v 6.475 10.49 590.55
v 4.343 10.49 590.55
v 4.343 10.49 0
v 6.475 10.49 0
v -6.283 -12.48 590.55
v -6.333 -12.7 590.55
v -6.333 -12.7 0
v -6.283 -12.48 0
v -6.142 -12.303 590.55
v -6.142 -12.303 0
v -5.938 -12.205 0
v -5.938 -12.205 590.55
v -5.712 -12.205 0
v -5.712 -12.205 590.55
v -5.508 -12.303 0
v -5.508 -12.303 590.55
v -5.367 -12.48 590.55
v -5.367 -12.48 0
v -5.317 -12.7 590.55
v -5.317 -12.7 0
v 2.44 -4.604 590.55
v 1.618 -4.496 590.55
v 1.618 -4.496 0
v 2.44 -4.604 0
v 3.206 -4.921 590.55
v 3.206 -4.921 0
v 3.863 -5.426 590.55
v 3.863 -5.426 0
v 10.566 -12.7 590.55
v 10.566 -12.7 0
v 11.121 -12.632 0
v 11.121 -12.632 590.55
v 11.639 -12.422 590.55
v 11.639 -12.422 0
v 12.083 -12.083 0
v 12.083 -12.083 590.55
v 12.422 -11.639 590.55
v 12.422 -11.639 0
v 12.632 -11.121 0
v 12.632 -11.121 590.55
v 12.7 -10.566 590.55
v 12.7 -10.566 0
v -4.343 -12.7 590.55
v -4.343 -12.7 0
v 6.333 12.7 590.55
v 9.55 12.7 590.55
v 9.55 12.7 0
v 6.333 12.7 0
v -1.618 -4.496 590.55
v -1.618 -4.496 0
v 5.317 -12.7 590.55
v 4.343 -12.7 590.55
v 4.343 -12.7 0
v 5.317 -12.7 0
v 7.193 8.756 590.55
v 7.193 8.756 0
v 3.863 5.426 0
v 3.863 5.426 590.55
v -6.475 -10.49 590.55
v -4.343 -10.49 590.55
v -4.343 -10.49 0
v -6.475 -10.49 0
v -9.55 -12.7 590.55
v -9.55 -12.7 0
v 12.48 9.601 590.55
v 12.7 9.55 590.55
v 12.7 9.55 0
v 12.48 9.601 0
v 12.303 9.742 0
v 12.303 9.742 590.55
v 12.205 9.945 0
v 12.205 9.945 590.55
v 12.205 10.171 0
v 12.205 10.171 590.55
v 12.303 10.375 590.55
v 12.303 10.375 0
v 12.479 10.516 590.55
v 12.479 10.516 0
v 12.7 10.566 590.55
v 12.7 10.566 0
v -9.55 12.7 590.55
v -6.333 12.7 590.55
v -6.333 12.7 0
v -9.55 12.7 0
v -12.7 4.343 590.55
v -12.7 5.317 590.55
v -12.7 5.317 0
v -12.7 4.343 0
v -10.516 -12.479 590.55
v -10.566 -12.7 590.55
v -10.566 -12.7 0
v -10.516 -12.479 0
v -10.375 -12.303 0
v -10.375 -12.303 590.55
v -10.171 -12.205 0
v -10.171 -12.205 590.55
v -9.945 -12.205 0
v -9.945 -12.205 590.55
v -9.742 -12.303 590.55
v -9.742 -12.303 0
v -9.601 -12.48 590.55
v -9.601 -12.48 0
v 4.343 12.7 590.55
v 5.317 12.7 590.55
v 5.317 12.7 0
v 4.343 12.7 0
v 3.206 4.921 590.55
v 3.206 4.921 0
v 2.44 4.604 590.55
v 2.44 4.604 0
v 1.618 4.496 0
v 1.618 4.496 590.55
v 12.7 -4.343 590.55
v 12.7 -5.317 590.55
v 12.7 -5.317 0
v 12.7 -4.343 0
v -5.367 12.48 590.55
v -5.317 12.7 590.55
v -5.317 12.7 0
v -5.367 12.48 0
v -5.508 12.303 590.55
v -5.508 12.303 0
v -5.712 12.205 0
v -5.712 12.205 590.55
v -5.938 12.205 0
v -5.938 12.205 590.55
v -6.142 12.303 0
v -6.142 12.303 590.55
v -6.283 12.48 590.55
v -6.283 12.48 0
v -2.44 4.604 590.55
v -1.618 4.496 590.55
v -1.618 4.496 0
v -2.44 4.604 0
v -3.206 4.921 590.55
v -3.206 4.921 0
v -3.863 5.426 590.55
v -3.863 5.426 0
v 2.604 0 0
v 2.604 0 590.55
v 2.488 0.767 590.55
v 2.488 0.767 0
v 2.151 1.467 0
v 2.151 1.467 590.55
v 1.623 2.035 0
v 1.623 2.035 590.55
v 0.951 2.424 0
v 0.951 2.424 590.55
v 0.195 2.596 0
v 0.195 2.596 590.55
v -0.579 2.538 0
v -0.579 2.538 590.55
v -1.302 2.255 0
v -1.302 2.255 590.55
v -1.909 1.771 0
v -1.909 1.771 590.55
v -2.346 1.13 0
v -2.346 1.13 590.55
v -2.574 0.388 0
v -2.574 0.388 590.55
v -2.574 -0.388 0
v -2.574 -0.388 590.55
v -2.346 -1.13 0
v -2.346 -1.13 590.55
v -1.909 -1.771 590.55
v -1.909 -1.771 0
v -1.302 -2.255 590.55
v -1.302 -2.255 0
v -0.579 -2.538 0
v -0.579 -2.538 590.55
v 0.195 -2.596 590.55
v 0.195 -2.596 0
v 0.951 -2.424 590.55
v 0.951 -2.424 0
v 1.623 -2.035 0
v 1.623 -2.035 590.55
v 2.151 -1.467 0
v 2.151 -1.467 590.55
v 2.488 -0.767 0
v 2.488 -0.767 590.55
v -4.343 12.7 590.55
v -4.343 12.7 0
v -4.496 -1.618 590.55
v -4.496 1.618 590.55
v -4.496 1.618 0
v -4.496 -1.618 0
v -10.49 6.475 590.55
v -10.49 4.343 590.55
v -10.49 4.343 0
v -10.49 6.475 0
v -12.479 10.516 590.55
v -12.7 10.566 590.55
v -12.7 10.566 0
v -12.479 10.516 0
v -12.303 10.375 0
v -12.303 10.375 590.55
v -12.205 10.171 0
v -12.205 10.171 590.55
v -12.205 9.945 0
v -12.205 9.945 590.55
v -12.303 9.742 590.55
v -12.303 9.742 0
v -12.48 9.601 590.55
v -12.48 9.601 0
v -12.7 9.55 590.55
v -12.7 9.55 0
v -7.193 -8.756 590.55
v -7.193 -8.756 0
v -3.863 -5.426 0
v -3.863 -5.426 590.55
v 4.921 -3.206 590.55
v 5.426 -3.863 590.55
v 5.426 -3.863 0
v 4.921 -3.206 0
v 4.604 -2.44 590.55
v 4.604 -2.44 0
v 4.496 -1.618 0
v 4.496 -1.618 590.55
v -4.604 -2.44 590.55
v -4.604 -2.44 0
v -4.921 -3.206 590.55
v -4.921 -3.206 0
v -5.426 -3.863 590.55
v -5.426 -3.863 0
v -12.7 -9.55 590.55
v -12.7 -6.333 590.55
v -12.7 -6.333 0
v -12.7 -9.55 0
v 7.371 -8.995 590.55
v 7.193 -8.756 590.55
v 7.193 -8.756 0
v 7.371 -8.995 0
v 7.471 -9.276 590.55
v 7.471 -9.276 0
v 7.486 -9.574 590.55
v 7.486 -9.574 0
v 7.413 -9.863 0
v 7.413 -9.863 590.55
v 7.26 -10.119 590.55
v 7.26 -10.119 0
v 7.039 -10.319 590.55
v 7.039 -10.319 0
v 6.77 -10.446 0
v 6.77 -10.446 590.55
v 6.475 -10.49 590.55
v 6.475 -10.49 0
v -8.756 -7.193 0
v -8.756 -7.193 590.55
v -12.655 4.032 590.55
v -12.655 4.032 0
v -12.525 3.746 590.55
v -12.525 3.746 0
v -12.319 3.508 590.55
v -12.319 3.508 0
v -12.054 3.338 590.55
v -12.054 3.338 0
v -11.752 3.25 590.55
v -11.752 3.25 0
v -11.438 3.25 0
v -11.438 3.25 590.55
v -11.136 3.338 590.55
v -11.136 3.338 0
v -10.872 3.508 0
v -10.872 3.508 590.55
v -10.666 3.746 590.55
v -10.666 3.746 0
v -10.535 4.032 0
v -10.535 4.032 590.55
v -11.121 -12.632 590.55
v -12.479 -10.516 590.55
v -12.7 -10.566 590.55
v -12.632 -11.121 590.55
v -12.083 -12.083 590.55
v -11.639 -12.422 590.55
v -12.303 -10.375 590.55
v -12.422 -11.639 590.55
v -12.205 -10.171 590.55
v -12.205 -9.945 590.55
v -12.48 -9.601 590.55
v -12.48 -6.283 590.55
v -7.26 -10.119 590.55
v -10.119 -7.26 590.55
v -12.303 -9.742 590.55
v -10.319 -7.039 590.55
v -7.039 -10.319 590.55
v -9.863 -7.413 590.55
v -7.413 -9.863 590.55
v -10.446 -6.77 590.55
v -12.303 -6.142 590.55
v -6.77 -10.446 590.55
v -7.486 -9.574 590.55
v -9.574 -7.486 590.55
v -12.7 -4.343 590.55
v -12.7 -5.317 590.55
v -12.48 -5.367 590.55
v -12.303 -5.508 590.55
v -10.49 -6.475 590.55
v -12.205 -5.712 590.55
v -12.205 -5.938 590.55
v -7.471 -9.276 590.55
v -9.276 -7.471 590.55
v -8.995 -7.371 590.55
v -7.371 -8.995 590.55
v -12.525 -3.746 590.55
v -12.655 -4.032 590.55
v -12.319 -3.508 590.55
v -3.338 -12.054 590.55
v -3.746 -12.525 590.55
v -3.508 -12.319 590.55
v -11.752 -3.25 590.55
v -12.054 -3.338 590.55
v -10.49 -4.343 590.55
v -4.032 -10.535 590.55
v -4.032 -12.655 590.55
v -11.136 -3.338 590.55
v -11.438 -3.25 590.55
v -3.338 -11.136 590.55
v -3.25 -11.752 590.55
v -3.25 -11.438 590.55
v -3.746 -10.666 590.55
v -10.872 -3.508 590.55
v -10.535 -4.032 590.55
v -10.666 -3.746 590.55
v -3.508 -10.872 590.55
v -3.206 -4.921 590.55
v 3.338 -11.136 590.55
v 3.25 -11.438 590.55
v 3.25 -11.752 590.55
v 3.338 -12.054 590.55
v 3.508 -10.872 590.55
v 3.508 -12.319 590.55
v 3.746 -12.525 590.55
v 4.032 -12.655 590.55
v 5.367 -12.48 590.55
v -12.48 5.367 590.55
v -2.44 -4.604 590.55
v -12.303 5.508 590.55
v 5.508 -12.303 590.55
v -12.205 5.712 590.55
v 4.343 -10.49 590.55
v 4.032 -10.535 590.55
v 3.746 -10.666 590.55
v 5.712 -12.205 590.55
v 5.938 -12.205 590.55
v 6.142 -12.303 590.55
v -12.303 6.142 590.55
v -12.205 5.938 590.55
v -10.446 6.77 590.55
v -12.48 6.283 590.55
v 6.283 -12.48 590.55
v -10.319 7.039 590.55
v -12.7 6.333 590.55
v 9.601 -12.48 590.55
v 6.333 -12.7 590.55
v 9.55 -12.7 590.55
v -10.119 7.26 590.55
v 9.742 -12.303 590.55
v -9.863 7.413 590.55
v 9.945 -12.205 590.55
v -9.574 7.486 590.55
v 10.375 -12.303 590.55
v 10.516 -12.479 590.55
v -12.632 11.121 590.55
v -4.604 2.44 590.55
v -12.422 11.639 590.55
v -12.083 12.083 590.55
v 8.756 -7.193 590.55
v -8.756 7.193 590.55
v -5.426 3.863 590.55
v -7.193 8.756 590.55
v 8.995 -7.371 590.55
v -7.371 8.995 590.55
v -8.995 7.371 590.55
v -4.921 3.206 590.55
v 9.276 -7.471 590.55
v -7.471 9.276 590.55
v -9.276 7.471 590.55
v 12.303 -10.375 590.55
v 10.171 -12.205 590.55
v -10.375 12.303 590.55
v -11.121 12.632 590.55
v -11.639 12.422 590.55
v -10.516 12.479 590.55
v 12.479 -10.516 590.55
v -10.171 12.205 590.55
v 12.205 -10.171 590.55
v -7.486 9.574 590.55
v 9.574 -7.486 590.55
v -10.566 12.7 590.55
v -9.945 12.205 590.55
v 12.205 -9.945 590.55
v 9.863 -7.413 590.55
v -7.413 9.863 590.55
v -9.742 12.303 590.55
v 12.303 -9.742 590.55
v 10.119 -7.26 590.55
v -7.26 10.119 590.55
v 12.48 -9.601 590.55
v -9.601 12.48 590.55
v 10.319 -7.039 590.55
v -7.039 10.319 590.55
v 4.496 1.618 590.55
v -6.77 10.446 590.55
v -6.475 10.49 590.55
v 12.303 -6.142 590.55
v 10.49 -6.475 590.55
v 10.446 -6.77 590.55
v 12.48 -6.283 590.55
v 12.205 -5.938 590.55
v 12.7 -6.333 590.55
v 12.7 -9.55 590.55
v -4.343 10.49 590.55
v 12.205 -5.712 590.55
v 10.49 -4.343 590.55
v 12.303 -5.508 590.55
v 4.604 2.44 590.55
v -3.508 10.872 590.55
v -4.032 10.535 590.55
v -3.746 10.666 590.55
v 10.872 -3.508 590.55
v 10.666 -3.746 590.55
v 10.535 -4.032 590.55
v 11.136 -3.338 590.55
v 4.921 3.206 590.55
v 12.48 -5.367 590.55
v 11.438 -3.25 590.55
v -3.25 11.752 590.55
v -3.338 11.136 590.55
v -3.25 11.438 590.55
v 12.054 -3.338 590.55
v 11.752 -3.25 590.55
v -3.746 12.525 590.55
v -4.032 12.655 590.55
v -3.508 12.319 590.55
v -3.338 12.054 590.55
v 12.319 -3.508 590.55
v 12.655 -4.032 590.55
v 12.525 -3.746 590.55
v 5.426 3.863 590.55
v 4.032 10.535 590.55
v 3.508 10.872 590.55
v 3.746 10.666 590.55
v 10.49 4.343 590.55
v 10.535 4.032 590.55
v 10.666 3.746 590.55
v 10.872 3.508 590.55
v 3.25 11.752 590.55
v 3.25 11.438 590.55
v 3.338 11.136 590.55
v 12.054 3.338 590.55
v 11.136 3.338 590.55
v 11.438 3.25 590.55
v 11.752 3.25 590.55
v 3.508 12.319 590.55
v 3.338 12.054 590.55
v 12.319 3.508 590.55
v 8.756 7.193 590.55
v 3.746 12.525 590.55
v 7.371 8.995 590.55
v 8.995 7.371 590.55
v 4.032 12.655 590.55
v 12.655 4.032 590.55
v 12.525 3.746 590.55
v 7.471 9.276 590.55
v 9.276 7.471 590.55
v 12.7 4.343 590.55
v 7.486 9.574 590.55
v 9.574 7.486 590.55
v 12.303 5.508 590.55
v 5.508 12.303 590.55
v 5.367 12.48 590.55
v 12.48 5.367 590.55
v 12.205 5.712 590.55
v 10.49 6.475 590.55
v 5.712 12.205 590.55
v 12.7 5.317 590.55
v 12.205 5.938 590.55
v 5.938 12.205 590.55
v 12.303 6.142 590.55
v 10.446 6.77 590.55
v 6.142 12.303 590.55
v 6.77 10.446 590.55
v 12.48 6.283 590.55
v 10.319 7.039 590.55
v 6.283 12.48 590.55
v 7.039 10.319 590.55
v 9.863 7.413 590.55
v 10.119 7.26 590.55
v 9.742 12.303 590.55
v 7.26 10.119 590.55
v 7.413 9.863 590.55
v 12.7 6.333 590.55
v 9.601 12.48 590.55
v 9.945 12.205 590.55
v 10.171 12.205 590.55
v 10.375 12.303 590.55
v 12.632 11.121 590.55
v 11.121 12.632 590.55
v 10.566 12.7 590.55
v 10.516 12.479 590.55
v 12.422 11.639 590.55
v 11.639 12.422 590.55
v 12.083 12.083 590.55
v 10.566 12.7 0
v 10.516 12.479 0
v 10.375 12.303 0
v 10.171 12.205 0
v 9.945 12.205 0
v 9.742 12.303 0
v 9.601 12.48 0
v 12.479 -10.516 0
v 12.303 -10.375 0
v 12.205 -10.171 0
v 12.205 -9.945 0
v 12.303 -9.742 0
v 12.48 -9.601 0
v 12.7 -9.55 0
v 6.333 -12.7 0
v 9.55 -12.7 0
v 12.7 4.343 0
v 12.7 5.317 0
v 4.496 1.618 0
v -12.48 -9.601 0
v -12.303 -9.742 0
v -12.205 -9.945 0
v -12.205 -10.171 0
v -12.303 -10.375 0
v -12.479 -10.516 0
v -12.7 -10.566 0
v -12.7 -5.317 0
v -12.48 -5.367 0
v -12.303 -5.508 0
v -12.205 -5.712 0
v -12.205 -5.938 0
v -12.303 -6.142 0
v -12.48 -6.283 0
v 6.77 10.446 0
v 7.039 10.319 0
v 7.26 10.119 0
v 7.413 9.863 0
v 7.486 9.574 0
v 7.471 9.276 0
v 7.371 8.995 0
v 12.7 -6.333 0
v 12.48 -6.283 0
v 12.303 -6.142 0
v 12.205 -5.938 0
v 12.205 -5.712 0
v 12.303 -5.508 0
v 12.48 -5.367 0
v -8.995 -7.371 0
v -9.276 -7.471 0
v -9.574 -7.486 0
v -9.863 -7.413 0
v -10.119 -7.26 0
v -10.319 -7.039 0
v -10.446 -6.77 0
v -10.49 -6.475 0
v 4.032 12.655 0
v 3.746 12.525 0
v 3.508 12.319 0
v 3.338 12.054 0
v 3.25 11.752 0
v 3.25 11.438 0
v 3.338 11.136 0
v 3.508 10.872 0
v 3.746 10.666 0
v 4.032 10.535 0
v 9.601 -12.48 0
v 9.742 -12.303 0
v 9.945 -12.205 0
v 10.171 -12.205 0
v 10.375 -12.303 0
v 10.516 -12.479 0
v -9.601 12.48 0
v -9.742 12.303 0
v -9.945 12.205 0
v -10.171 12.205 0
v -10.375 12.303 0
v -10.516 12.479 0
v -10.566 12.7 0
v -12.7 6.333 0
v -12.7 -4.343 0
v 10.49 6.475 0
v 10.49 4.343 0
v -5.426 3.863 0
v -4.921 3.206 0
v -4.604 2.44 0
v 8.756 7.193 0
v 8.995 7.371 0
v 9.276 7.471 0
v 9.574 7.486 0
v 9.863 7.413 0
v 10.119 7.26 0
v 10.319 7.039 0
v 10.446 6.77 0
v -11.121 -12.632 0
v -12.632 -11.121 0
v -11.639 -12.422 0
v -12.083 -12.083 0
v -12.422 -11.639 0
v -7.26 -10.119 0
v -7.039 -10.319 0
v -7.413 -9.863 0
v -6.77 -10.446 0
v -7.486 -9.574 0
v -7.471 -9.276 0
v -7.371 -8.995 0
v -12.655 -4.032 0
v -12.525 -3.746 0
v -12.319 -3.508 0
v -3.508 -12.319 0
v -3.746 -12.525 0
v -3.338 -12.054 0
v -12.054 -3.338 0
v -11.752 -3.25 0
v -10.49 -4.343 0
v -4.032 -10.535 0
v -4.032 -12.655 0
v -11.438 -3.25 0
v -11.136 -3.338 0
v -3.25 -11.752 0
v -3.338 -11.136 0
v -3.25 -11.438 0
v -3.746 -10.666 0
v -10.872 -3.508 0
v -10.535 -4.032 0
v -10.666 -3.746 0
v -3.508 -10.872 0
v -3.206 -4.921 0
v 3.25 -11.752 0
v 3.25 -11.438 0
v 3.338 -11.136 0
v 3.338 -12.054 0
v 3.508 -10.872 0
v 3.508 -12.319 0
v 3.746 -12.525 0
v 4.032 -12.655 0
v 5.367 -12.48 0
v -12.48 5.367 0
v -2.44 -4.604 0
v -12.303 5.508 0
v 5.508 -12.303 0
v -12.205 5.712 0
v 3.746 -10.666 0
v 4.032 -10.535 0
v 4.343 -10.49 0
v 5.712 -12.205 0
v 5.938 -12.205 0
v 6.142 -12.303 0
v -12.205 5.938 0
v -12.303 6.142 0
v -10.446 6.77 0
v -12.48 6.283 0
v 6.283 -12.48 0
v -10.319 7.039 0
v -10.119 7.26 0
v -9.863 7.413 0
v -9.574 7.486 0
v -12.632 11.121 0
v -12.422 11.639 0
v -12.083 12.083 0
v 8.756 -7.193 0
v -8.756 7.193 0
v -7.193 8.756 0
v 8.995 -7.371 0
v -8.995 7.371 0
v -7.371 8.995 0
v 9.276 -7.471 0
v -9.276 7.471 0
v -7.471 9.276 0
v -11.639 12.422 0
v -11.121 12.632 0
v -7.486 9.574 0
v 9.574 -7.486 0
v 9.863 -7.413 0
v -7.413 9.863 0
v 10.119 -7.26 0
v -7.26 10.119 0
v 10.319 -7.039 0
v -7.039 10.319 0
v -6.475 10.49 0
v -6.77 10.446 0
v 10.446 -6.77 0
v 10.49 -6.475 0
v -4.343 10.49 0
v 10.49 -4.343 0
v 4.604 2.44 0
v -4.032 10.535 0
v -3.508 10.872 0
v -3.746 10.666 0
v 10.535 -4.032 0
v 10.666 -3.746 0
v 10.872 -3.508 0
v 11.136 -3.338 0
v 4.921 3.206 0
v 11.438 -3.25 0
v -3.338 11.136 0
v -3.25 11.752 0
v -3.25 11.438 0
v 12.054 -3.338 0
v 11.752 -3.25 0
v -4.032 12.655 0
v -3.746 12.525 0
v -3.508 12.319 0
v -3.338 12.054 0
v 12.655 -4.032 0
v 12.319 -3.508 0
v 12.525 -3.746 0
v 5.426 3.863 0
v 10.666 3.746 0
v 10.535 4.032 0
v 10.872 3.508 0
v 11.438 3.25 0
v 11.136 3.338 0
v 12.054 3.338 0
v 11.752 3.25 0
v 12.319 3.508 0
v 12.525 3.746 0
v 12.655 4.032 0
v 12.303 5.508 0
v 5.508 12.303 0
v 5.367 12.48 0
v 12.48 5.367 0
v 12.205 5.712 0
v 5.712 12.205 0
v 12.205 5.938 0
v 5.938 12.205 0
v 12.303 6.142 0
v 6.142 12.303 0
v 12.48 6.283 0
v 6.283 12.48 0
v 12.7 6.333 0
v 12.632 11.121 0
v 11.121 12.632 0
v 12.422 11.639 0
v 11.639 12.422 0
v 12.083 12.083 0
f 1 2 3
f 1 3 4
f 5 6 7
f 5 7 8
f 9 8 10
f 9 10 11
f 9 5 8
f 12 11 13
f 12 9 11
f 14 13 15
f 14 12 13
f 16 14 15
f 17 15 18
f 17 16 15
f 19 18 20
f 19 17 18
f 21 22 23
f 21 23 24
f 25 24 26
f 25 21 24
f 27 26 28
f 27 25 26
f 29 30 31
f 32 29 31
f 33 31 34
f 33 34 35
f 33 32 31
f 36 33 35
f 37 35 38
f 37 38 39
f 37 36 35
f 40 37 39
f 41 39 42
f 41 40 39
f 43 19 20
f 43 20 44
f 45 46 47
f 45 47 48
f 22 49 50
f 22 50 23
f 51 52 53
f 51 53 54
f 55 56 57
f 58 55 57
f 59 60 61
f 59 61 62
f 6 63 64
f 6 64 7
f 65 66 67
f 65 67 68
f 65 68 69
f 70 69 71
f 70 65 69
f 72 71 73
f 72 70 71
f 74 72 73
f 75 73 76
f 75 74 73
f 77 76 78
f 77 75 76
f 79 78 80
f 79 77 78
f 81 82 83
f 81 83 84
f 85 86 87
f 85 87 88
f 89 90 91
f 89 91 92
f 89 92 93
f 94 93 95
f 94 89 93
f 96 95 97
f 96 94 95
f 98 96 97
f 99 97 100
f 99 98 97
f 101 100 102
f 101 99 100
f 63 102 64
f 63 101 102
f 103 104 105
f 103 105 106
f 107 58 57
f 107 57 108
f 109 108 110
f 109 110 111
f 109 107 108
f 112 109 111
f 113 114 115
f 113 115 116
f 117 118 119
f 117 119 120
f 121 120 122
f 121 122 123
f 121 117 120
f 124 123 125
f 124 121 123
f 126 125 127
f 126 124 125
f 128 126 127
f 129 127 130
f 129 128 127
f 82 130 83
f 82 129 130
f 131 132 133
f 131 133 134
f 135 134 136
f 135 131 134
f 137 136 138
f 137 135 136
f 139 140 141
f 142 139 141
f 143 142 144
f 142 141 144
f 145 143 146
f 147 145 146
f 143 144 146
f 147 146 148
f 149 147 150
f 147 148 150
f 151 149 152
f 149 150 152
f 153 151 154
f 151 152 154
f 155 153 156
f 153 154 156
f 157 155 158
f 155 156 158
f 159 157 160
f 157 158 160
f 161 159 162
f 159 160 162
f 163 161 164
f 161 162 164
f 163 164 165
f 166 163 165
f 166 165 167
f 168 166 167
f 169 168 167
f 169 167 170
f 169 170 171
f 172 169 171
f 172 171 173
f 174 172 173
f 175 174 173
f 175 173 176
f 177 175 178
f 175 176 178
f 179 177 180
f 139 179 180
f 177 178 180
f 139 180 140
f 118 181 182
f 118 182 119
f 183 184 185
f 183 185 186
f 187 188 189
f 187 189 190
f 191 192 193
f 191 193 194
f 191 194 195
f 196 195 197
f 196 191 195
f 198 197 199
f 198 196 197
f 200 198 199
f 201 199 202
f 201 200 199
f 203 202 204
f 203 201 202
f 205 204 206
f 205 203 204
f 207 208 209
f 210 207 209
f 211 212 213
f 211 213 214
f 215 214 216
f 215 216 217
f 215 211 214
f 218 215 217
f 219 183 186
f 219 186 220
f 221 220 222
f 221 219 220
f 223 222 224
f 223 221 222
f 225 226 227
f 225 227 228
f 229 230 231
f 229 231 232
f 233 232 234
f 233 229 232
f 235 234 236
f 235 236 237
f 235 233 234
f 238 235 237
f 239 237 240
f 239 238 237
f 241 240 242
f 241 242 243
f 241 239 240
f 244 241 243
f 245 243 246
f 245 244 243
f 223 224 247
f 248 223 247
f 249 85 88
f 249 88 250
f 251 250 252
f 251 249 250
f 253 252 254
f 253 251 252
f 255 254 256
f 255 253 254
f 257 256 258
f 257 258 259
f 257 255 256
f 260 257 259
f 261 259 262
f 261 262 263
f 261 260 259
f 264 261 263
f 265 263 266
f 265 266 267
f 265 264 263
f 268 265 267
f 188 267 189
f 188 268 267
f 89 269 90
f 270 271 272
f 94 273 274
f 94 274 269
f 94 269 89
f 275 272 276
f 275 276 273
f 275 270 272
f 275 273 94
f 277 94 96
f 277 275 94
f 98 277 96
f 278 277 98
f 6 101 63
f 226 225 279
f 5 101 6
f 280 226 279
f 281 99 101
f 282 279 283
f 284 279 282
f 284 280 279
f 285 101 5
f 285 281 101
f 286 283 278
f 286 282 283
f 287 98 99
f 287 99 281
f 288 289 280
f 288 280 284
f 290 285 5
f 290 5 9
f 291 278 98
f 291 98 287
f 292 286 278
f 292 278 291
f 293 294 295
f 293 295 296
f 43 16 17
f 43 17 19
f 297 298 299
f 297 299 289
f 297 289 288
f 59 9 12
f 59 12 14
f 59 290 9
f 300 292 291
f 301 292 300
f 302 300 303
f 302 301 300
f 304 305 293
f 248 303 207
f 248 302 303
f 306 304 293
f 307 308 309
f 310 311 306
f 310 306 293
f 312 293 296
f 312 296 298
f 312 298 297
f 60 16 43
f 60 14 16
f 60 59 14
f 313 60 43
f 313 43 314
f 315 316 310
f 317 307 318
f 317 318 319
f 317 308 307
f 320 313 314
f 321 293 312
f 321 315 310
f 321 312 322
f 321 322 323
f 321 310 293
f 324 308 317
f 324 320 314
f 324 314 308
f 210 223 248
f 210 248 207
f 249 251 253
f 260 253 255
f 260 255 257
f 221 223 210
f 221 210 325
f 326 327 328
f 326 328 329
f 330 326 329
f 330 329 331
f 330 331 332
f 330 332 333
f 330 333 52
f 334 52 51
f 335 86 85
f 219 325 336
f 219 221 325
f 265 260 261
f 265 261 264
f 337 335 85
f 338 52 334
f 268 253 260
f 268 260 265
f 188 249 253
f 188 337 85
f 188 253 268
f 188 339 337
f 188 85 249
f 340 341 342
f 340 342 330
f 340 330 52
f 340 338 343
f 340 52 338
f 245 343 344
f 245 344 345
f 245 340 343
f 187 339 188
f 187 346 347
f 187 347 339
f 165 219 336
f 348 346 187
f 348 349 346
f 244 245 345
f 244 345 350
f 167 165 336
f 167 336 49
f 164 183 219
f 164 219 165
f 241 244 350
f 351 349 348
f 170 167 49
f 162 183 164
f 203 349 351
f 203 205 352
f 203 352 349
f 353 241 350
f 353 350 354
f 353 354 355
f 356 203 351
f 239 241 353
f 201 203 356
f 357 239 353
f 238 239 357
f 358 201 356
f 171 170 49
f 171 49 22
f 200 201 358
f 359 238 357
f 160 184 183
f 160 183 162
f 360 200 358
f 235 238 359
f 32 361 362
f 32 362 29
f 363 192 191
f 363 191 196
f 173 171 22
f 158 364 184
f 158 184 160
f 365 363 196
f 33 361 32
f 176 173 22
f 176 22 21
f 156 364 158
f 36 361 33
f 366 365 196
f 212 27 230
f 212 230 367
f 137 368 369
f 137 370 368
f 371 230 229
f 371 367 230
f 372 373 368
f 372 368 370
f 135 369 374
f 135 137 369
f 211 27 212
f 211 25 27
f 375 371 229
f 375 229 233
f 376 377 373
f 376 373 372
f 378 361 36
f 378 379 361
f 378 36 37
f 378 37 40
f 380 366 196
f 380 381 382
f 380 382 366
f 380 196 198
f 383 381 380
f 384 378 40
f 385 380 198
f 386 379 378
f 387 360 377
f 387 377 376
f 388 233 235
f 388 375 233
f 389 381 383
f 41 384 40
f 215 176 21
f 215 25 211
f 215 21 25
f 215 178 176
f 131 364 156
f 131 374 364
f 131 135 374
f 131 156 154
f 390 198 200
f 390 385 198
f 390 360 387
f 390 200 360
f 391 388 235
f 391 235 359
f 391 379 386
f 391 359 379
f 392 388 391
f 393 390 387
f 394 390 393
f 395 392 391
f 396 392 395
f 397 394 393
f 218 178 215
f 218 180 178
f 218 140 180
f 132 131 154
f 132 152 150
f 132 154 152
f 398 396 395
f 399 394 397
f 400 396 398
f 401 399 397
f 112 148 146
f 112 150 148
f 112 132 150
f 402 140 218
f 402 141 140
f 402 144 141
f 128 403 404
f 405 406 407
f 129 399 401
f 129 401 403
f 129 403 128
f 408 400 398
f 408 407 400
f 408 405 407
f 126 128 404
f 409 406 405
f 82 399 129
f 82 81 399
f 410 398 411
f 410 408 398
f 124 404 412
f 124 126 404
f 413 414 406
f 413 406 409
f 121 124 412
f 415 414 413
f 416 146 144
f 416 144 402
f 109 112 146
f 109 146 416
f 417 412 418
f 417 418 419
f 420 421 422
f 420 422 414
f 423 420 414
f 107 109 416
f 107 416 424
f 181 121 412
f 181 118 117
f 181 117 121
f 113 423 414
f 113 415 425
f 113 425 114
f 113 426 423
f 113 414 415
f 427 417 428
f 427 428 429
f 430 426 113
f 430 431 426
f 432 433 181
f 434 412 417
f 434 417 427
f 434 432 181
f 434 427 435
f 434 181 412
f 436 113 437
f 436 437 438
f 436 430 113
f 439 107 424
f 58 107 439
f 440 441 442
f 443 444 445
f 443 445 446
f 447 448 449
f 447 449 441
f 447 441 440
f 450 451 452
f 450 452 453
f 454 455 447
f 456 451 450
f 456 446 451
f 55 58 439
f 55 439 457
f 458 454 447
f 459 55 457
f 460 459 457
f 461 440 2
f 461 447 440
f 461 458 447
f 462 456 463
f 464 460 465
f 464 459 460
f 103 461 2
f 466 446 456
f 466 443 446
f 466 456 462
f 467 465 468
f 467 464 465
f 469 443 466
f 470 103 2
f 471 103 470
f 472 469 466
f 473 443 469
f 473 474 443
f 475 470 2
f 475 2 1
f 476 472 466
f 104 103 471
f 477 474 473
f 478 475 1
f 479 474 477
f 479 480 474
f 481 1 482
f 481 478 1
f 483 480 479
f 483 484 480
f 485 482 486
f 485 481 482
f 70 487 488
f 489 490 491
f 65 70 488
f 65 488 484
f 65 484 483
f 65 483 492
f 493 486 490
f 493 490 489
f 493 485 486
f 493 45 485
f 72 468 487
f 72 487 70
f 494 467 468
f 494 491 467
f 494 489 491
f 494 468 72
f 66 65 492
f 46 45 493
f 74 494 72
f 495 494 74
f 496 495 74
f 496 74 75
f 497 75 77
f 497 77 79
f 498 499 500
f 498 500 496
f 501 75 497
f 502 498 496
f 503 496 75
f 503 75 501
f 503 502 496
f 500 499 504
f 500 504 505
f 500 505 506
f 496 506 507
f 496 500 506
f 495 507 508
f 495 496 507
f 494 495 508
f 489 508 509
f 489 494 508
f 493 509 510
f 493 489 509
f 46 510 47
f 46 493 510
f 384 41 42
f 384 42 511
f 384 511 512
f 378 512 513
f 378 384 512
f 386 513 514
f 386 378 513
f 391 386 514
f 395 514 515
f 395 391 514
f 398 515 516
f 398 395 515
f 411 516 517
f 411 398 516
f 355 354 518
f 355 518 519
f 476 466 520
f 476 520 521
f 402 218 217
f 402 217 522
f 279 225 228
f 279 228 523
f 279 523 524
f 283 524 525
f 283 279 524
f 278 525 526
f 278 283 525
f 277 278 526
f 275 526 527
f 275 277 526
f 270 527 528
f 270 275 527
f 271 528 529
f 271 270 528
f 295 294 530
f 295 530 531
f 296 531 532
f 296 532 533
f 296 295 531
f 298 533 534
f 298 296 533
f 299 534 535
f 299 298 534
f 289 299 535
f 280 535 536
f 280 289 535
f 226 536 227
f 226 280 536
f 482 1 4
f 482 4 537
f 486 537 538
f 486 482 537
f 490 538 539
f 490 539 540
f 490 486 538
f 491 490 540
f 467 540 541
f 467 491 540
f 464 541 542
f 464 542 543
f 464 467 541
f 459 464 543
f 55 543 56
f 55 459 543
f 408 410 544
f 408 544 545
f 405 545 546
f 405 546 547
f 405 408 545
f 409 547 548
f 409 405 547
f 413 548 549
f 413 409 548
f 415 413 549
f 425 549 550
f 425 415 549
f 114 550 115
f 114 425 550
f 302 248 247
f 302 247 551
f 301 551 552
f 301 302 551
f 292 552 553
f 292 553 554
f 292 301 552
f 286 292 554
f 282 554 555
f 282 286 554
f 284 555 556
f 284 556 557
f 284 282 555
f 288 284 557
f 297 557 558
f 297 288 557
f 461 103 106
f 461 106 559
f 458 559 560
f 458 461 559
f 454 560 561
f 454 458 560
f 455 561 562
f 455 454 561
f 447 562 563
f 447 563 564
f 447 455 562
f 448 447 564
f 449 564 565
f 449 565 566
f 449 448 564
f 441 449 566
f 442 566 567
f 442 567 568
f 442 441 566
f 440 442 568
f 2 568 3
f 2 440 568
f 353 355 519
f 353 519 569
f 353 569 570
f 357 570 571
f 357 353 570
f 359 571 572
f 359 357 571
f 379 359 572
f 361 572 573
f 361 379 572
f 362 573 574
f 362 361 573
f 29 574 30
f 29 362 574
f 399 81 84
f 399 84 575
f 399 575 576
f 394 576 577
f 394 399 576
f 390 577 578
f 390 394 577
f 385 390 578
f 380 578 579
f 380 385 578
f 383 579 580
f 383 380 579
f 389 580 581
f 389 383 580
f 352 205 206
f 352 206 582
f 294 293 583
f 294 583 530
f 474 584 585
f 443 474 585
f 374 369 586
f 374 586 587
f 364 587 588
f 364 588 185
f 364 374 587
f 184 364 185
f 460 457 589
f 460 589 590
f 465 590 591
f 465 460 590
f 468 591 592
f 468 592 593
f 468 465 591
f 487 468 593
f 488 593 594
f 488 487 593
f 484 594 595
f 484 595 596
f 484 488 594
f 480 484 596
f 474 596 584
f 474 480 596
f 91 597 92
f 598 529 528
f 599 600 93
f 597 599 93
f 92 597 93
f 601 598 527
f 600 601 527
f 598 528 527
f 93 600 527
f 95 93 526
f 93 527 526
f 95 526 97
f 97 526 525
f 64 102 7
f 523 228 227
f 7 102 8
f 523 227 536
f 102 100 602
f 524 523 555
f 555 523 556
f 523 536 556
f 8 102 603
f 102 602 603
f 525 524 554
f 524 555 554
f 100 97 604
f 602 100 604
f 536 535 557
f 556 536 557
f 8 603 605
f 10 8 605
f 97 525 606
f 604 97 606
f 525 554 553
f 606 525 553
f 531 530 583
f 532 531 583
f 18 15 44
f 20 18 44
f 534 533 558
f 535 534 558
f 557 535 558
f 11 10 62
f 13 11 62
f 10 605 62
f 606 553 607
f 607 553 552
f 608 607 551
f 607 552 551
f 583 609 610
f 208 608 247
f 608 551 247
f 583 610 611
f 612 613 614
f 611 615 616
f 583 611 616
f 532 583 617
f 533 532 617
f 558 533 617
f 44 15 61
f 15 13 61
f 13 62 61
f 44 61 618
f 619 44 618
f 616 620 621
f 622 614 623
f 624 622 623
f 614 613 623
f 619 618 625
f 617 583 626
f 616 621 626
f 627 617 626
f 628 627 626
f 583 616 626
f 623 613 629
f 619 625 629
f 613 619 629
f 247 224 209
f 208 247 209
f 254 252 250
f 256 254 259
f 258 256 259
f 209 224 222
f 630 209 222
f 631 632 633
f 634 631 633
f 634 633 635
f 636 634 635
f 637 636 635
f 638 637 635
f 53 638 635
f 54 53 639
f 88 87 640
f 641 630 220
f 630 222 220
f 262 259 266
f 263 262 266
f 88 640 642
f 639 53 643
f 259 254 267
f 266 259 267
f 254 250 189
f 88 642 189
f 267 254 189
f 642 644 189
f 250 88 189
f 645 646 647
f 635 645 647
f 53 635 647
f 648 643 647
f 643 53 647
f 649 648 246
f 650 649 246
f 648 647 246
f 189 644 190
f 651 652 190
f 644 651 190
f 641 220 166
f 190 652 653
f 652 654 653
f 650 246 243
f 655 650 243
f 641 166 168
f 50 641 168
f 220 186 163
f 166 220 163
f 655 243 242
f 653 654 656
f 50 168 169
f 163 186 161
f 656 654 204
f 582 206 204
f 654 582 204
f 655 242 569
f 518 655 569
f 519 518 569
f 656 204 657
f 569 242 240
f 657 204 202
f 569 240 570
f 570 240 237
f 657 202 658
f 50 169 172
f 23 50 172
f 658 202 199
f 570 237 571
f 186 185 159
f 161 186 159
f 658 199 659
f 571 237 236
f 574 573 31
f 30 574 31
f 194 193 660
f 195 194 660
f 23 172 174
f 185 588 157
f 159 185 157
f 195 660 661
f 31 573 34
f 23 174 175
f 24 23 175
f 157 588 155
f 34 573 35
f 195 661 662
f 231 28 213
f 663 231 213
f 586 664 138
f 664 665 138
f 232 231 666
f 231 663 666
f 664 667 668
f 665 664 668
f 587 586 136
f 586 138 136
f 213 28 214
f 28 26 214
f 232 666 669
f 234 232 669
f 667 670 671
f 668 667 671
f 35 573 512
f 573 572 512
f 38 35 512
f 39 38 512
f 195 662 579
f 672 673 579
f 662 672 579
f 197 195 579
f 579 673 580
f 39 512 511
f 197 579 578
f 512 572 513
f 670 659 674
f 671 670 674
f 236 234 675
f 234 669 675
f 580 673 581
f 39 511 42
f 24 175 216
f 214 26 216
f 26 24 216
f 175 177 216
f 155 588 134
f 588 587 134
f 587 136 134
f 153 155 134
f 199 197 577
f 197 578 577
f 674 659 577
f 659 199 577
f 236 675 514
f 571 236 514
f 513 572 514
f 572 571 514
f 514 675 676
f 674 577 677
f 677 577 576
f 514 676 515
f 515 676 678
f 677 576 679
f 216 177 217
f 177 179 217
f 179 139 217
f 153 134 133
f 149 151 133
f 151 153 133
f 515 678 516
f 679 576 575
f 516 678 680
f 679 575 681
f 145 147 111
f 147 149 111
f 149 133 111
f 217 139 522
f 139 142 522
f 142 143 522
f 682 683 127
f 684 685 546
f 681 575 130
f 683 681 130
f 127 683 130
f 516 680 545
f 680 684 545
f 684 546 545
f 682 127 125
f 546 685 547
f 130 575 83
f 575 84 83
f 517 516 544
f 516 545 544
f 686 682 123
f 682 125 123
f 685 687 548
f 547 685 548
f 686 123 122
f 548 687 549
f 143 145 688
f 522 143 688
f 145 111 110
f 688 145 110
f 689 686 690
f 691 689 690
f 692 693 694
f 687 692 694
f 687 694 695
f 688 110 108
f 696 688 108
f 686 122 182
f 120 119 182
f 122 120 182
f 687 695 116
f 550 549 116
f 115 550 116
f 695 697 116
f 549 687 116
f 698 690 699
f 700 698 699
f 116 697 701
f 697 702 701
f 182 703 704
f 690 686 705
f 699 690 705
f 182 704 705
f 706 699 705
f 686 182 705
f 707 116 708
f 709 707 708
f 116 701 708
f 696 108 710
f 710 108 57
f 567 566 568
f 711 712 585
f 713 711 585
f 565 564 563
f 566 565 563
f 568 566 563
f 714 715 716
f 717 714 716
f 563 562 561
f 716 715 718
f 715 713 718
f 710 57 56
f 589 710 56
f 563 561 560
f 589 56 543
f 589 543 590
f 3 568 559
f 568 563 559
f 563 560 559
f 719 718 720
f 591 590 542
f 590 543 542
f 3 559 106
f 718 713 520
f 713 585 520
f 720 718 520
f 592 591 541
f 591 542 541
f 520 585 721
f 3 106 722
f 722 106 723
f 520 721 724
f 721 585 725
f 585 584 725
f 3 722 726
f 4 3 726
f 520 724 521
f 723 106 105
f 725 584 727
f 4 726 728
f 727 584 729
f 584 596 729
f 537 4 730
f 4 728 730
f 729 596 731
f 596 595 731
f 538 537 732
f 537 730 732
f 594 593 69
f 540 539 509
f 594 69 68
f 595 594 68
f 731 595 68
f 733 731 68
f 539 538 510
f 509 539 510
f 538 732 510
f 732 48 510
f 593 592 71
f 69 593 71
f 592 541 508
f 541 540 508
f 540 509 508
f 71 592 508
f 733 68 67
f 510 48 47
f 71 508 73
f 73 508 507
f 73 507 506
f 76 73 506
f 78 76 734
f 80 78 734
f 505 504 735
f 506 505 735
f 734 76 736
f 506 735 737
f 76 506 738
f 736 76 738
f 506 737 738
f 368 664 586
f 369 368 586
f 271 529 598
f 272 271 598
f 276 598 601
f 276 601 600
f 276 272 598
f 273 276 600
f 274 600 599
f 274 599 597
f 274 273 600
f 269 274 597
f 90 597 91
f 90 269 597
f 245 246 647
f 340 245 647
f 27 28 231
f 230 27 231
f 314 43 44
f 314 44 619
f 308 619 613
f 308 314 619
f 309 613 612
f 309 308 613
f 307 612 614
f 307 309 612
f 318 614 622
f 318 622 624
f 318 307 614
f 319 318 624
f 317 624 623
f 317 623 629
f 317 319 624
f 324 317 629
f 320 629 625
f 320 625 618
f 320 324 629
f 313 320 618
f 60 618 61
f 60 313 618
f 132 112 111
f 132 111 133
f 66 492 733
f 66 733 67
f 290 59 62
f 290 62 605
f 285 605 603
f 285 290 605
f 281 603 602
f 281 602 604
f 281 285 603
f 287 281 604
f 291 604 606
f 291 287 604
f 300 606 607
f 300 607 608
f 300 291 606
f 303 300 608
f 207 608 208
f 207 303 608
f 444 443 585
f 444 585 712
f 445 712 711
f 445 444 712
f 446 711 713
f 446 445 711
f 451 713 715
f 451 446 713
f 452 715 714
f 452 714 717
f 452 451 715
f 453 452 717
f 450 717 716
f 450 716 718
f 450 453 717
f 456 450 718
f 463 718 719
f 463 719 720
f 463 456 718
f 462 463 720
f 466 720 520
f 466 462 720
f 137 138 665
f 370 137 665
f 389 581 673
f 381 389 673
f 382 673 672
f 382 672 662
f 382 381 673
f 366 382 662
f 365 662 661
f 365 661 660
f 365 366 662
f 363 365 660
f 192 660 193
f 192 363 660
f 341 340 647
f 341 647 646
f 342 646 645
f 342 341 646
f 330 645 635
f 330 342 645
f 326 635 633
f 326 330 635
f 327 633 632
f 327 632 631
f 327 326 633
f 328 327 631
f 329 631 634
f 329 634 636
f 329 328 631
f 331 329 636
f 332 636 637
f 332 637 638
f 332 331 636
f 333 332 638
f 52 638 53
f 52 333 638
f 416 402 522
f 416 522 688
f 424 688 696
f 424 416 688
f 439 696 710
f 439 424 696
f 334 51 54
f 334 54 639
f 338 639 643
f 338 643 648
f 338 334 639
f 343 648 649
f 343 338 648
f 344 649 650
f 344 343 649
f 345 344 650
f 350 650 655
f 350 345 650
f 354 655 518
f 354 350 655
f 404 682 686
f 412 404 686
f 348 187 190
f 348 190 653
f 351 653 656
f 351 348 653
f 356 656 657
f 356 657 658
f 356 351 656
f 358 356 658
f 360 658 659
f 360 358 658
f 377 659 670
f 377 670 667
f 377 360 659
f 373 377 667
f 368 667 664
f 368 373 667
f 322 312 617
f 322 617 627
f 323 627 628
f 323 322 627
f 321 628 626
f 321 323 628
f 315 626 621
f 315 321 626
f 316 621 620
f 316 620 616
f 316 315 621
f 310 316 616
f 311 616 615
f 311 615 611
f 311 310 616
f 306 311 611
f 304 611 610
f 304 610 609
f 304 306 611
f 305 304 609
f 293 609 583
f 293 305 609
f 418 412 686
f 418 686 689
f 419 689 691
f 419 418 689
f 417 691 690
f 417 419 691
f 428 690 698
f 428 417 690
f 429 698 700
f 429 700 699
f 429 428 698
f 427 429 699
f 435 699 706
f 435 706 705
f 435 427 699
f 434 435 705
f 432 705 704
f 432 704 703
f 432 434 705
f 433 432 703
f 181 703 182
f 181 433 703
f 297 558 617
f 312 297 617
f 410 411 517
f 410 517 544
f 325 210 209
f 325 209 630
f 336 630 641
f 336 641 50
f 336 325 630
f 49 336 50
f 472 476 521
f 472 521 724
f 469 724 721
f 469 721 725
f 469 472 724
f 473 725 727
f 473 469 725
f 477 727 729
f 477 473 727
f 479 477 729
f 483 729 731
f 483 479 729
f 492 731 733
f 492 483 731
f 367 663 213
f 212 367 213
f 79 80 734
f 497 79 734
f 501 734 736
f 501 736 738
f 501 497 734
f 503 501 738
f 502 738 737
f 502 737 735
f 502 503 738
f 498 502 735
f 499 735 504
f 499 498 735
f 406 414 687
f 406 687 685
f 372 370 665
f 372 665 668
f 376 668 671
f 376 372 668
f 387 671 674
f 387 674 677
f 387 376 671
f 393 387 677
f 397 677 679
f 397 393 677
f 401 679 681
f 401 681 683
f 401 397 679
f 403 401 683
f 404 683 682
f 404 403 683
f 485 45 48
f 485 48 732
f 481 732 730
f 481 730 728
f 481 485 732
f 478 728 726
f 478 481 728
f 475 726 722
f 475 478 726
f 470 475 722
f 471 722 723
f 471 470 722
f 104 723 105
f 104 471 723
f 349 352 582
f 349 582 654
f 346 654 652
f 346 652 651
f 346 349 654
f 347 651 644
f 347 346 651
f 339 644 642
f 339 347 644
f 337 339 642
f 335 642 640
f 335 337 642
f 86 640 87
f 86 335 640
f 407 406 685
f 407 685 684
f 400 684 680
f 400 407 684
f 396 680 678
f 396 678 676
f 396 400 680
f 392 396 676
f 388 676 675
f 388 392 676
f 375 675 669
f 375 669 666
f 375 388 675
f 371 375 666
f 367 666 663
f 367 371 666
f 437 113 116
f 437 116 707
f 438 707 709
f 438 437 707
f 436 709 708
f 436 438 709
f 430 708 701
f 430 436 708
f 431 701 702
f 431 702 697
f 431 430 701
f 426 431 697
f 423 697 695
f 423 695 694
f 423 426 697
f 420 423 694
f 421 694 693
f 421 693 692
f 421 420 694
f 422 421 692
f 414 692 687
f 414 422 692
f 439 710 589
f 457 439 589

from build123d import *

# Parameters (mm, degrees)
SKETCH1_R           = 2.6035
BOSS_EXTRUDE1_DEPTH = 590.55


with BuildPart() as part:
    # Sketch1 → Boss-Extrude1 (new body)
    with BuildSketch(Plane.XY.offset(590.55)):
        with BuildLine():
            Line((-12.7, -6.3330836), (-12.7, -9.5504))
            ThreePointArc((-12.7, -9.5504), (-12.192000006, -10.058323491), (-12.699846982, -10.566399977))
            ThreePointArc((-12.699846982, -10.566399977), (-12.082522516, -12.082522516), (-10.566399977, -12.699846982))
            ThreePointArc((-10.566399977, -12.699846982), (-10.058323491, -12.192000006), (-9.5504, -12.7))
            Line((-9.5504, -12.7), (-6.3330836, -12.7))
            ThreePointArc((-6.3330836, -12.7), (-5.8250836, -12.192), (-5.3170836, -12.7))
            Line((-5.3170836, -12.7), (-4.343399971, -12.7))
            ThreePointArc((-4.343399971, -12.7), (-3.238499971, -11.5951), (-4.343399971, -10.4902))
            Line((-4.343399971, -10.4902), (-6.474794456, -10.4902))
            ThreePointArc((-6.474794456, -10.4902), (-7.413456061, -9.863006367), (-7.193214945, -8.75577951))
            Line((-7.193214945, -8.75577951), (-3.863171405, -5.42573597))
            ThreePointArc((-3.863171405, -5.42573597), (-2.833127272, -4.737482484), (-1.618107374, -4.4958))
            Line((-1.618107374, -4.4958), (1.618107374, -4.4958))
            ThreePointArc((1.618107374, -4.4958), (2.833127272, -4.737482484), (3.863171405, -5.42573597))
            Line((3.863171405, -5.42573597), (7.193214945, -8.75577951))
            ThreePointArc((7.193214945, -8.75577951), (7.413456061, -9.863006367), (6.474794456, -10.4902))
            Line((6.474794456, -10.4902), (4.3434, -10.4902))
            ThreePointArc((4.3434, -10.4902), (3.2385, -11.5951), (4.3434, -12.7))
            Line((4.3434, -12.7), (5.3170836, -12.7))
            ThreePointArc((5.3170836, -12.7), (5.8250836, -12.192), (6.3330836, -12.7))
            Line((6.3330836, -12.7), (9.5504, -12.7))
            ThreePointArc((9.5504, -12.7), (10.058323491, -12.192000006), (10.566399977, -12.699846982))
            ThreePointArc((10.566399977, -12.699846982), (12.082522516, -12.082522516), (12.699846982, -10.566399977))
            ThreePointArc((12.699846982, -10.566399977), (12.192000006, -10.058323491), (12.7, -9.5504))
            Line((12.7, -9.5504), (12.7, -6.3330836))
            ThreePointArc((12.7, -6.3330836), (12.192, -5.8250836), (12.7, -5.3170836))
            Line((12.7, -5.3170836), (12.7, -4.343399971))
            ThreePointArc((12.7, -4.343399971), (11.5951, -3.238499971), (10.4902, -4.343399971))
            Line((10.4902, -4.343399971), (10.4902, -6.474794456))
            ThreePointArc((10.4902, -6.474794456), (9.863006367, -7.413456061), (8.75577951, -7.193214945))
            Line((8.75577951, -7.193214945), (5.42573597, -3.863171405))
            ThreePointArc((5.42573597, -3.863171405), (4.737482484, -2.833127272), (4.4958, -1.618107374))
            Line((4.4958, -1.618107374), (4.4958, 1.618107374))
            ThreePointArc((4.4958, 1.618107374), (4.737482484, 2.833127272), (5.42573597, 3.863171405))
            Line((5.42573597, 3.863171405), (8.75577951, 7.193214945))
            ThreePointArc((8.75577951, 7.193214945), (9.863006367, 7.413456061), (10.4902, 6.474794456))
            Line((10.4902, 6.474794456), (10.4902, 4.3434))
            ThreePointArc((10.4902, 4.3434), (11.5951, 3.2385), (12.7, 4.3434))
            Line((12.7, 4.3434), (12.7, 5.3170836))
            ThreePointArc((12.7, 5.3170836), (12.192, 5.8250836), (12.7, 6.3330836))
            Line((12.7, 6.3330836), (12.7, 9.5504))
            ThreePointArc((12.7, 9.5504), (12.192000006, 10.058323491), (12.699846982, 10.566399977))
            ThreePointArc((12.699846982, 10.566399977), (12.082522516, 12.082522516), (10.566399977, 12.699846982))
            ThreePointArc((10.566399977, 12.699846982), (10.058323491, 12.192000006), (9.5504, 12.7))
            Line((9.5504, 12.7), (6.3330836, 12.7))
            ThreePointArc((6.3330836, 12.7), (5.8250836, 12.192), (5.3170836, 12.7))
            Line((5.3170836, 12.7), (4.343399971, 12.7))
            ThreePointArc((4.343399971, 12.7), (3.238499971, 11.5951), (4.343399971, 10.4902))
            Line((4.343399971, 10.4902), (6.474794456, 10.4902))
            ThreePointArc((6.474794456, 10.4902), (7.413456061, 9.863006367), (7.193214945, 8.75577951))
            Line((7.193214945, 8.75577951), (3.863171405, 5.42573597))
            ThreePointArc((3.863171405, 5.42573597), (2.833127272, 4.737482484), (1.618107374, 4.4958))
            Line((1.618107374, 4.4958), (-1.618107374, 4.4958))
            ThreePointArc((-1.618107374, 4.4958), (-2.833127272, 4.737482484), (-3.863171405, 5.42573597))
            Line((-3.863171405, 5.42573597), (-7.193214945, 8.75577951))
            ThreePointArc((-7.193214945, 8.75577951), (-7.413456061, 9.863006367), (-6.474794456, 10.4902))
            Line((-6.474794456, 10.4902), (-4.3434, 10.4902))
            ThreePointArc((-4.3434, 10.4902), (-3.2385, 11.5951), (-4.3434, 12.7))
            Line((-4.3434, 12.7), (-5.3170836, 12.7))
            ThreePointArc((-5.3170836, 12.7), (-5.8250836, 12.192), (-6.3330836, 12.7))
            Line((-6.3330836, 12.7), (-9.5504, 12.7))
            ThreePointArc((-9.5504, 12.7), (-10.058323491, 12.192000006), (-10.566399977, 12.699846982))
            ThreePointArc((-10.566399977, 12.699846982), (-12.082522516, 12.082522516), (-12.699846982, 10.566399977))
            ThreePointArc((-12.699846982, 10.566399977), (-12.192000006, 10.058323491), (-12.7, 9.5504))
            Line((-12.7, 9.5504), (-12.7, 6.3330836))
            ThreePointArc((-12.7, 6.3330836), (-12.192, 5.8250836), (-12.7, 5.3170836))
            Line((-12.7, 5.3170836), (-12.7, 4.343399971))
            ThreePointArc((-12.7, 4.343399971), (-11.5951, 3.238499971), (-10.4902, 4.343399971))
            Line((-10.4902, 4.343399971), (-10.4902, 6.474794456))
            ThreePointArc((-10.4902, 6.474794456), (-9.863006367, 7.413456061), (-8.75577951, 7.193214945))
            Line((-8.75577951, 7.193214945), (-5.42573597, 3.863171405))
            ThreePointArc((-5.42573597, 3.863171405), (-4.737482484, 2.833127272), (-4.4958, 1.618107374))
            Line((-4.4958, 1.618107374), (-4.4958, -1.618107374))
            ThreePointArc((-4.4958, -1.618107374), (-4.737482484, -2.833127272), (-5.42573597, -3.863171405))
            Line((-5.42573597, -3.863171405), (-8.75577951, -7.193214945))
            ThreePointArc((-8.75577951, -7.193214945), (-9.863006367, -7.413456061), (-10.4902, -6.474794456))
            Line((-10.4902, -6.474794456), (-10.4902, -4.3434))
            ThreePointArc((-10.4902, -4.3434), (-11.5951, -3.2385), (-12.7, -4.3434))
            Line((-12.7, -4.3434), (-12.7, -5.3170836))
            ThreePointArc((-12.7, -5.3170836), (-12.192, -5.8250836), (-12.7, -6.3330836))
        make_face()
        Circle(SKETCH1_R, mode=Mode.SUBTRACT)
    extrude(amount=-BOSS_EXTRUDE1_DEPTH)


solid = part.part
